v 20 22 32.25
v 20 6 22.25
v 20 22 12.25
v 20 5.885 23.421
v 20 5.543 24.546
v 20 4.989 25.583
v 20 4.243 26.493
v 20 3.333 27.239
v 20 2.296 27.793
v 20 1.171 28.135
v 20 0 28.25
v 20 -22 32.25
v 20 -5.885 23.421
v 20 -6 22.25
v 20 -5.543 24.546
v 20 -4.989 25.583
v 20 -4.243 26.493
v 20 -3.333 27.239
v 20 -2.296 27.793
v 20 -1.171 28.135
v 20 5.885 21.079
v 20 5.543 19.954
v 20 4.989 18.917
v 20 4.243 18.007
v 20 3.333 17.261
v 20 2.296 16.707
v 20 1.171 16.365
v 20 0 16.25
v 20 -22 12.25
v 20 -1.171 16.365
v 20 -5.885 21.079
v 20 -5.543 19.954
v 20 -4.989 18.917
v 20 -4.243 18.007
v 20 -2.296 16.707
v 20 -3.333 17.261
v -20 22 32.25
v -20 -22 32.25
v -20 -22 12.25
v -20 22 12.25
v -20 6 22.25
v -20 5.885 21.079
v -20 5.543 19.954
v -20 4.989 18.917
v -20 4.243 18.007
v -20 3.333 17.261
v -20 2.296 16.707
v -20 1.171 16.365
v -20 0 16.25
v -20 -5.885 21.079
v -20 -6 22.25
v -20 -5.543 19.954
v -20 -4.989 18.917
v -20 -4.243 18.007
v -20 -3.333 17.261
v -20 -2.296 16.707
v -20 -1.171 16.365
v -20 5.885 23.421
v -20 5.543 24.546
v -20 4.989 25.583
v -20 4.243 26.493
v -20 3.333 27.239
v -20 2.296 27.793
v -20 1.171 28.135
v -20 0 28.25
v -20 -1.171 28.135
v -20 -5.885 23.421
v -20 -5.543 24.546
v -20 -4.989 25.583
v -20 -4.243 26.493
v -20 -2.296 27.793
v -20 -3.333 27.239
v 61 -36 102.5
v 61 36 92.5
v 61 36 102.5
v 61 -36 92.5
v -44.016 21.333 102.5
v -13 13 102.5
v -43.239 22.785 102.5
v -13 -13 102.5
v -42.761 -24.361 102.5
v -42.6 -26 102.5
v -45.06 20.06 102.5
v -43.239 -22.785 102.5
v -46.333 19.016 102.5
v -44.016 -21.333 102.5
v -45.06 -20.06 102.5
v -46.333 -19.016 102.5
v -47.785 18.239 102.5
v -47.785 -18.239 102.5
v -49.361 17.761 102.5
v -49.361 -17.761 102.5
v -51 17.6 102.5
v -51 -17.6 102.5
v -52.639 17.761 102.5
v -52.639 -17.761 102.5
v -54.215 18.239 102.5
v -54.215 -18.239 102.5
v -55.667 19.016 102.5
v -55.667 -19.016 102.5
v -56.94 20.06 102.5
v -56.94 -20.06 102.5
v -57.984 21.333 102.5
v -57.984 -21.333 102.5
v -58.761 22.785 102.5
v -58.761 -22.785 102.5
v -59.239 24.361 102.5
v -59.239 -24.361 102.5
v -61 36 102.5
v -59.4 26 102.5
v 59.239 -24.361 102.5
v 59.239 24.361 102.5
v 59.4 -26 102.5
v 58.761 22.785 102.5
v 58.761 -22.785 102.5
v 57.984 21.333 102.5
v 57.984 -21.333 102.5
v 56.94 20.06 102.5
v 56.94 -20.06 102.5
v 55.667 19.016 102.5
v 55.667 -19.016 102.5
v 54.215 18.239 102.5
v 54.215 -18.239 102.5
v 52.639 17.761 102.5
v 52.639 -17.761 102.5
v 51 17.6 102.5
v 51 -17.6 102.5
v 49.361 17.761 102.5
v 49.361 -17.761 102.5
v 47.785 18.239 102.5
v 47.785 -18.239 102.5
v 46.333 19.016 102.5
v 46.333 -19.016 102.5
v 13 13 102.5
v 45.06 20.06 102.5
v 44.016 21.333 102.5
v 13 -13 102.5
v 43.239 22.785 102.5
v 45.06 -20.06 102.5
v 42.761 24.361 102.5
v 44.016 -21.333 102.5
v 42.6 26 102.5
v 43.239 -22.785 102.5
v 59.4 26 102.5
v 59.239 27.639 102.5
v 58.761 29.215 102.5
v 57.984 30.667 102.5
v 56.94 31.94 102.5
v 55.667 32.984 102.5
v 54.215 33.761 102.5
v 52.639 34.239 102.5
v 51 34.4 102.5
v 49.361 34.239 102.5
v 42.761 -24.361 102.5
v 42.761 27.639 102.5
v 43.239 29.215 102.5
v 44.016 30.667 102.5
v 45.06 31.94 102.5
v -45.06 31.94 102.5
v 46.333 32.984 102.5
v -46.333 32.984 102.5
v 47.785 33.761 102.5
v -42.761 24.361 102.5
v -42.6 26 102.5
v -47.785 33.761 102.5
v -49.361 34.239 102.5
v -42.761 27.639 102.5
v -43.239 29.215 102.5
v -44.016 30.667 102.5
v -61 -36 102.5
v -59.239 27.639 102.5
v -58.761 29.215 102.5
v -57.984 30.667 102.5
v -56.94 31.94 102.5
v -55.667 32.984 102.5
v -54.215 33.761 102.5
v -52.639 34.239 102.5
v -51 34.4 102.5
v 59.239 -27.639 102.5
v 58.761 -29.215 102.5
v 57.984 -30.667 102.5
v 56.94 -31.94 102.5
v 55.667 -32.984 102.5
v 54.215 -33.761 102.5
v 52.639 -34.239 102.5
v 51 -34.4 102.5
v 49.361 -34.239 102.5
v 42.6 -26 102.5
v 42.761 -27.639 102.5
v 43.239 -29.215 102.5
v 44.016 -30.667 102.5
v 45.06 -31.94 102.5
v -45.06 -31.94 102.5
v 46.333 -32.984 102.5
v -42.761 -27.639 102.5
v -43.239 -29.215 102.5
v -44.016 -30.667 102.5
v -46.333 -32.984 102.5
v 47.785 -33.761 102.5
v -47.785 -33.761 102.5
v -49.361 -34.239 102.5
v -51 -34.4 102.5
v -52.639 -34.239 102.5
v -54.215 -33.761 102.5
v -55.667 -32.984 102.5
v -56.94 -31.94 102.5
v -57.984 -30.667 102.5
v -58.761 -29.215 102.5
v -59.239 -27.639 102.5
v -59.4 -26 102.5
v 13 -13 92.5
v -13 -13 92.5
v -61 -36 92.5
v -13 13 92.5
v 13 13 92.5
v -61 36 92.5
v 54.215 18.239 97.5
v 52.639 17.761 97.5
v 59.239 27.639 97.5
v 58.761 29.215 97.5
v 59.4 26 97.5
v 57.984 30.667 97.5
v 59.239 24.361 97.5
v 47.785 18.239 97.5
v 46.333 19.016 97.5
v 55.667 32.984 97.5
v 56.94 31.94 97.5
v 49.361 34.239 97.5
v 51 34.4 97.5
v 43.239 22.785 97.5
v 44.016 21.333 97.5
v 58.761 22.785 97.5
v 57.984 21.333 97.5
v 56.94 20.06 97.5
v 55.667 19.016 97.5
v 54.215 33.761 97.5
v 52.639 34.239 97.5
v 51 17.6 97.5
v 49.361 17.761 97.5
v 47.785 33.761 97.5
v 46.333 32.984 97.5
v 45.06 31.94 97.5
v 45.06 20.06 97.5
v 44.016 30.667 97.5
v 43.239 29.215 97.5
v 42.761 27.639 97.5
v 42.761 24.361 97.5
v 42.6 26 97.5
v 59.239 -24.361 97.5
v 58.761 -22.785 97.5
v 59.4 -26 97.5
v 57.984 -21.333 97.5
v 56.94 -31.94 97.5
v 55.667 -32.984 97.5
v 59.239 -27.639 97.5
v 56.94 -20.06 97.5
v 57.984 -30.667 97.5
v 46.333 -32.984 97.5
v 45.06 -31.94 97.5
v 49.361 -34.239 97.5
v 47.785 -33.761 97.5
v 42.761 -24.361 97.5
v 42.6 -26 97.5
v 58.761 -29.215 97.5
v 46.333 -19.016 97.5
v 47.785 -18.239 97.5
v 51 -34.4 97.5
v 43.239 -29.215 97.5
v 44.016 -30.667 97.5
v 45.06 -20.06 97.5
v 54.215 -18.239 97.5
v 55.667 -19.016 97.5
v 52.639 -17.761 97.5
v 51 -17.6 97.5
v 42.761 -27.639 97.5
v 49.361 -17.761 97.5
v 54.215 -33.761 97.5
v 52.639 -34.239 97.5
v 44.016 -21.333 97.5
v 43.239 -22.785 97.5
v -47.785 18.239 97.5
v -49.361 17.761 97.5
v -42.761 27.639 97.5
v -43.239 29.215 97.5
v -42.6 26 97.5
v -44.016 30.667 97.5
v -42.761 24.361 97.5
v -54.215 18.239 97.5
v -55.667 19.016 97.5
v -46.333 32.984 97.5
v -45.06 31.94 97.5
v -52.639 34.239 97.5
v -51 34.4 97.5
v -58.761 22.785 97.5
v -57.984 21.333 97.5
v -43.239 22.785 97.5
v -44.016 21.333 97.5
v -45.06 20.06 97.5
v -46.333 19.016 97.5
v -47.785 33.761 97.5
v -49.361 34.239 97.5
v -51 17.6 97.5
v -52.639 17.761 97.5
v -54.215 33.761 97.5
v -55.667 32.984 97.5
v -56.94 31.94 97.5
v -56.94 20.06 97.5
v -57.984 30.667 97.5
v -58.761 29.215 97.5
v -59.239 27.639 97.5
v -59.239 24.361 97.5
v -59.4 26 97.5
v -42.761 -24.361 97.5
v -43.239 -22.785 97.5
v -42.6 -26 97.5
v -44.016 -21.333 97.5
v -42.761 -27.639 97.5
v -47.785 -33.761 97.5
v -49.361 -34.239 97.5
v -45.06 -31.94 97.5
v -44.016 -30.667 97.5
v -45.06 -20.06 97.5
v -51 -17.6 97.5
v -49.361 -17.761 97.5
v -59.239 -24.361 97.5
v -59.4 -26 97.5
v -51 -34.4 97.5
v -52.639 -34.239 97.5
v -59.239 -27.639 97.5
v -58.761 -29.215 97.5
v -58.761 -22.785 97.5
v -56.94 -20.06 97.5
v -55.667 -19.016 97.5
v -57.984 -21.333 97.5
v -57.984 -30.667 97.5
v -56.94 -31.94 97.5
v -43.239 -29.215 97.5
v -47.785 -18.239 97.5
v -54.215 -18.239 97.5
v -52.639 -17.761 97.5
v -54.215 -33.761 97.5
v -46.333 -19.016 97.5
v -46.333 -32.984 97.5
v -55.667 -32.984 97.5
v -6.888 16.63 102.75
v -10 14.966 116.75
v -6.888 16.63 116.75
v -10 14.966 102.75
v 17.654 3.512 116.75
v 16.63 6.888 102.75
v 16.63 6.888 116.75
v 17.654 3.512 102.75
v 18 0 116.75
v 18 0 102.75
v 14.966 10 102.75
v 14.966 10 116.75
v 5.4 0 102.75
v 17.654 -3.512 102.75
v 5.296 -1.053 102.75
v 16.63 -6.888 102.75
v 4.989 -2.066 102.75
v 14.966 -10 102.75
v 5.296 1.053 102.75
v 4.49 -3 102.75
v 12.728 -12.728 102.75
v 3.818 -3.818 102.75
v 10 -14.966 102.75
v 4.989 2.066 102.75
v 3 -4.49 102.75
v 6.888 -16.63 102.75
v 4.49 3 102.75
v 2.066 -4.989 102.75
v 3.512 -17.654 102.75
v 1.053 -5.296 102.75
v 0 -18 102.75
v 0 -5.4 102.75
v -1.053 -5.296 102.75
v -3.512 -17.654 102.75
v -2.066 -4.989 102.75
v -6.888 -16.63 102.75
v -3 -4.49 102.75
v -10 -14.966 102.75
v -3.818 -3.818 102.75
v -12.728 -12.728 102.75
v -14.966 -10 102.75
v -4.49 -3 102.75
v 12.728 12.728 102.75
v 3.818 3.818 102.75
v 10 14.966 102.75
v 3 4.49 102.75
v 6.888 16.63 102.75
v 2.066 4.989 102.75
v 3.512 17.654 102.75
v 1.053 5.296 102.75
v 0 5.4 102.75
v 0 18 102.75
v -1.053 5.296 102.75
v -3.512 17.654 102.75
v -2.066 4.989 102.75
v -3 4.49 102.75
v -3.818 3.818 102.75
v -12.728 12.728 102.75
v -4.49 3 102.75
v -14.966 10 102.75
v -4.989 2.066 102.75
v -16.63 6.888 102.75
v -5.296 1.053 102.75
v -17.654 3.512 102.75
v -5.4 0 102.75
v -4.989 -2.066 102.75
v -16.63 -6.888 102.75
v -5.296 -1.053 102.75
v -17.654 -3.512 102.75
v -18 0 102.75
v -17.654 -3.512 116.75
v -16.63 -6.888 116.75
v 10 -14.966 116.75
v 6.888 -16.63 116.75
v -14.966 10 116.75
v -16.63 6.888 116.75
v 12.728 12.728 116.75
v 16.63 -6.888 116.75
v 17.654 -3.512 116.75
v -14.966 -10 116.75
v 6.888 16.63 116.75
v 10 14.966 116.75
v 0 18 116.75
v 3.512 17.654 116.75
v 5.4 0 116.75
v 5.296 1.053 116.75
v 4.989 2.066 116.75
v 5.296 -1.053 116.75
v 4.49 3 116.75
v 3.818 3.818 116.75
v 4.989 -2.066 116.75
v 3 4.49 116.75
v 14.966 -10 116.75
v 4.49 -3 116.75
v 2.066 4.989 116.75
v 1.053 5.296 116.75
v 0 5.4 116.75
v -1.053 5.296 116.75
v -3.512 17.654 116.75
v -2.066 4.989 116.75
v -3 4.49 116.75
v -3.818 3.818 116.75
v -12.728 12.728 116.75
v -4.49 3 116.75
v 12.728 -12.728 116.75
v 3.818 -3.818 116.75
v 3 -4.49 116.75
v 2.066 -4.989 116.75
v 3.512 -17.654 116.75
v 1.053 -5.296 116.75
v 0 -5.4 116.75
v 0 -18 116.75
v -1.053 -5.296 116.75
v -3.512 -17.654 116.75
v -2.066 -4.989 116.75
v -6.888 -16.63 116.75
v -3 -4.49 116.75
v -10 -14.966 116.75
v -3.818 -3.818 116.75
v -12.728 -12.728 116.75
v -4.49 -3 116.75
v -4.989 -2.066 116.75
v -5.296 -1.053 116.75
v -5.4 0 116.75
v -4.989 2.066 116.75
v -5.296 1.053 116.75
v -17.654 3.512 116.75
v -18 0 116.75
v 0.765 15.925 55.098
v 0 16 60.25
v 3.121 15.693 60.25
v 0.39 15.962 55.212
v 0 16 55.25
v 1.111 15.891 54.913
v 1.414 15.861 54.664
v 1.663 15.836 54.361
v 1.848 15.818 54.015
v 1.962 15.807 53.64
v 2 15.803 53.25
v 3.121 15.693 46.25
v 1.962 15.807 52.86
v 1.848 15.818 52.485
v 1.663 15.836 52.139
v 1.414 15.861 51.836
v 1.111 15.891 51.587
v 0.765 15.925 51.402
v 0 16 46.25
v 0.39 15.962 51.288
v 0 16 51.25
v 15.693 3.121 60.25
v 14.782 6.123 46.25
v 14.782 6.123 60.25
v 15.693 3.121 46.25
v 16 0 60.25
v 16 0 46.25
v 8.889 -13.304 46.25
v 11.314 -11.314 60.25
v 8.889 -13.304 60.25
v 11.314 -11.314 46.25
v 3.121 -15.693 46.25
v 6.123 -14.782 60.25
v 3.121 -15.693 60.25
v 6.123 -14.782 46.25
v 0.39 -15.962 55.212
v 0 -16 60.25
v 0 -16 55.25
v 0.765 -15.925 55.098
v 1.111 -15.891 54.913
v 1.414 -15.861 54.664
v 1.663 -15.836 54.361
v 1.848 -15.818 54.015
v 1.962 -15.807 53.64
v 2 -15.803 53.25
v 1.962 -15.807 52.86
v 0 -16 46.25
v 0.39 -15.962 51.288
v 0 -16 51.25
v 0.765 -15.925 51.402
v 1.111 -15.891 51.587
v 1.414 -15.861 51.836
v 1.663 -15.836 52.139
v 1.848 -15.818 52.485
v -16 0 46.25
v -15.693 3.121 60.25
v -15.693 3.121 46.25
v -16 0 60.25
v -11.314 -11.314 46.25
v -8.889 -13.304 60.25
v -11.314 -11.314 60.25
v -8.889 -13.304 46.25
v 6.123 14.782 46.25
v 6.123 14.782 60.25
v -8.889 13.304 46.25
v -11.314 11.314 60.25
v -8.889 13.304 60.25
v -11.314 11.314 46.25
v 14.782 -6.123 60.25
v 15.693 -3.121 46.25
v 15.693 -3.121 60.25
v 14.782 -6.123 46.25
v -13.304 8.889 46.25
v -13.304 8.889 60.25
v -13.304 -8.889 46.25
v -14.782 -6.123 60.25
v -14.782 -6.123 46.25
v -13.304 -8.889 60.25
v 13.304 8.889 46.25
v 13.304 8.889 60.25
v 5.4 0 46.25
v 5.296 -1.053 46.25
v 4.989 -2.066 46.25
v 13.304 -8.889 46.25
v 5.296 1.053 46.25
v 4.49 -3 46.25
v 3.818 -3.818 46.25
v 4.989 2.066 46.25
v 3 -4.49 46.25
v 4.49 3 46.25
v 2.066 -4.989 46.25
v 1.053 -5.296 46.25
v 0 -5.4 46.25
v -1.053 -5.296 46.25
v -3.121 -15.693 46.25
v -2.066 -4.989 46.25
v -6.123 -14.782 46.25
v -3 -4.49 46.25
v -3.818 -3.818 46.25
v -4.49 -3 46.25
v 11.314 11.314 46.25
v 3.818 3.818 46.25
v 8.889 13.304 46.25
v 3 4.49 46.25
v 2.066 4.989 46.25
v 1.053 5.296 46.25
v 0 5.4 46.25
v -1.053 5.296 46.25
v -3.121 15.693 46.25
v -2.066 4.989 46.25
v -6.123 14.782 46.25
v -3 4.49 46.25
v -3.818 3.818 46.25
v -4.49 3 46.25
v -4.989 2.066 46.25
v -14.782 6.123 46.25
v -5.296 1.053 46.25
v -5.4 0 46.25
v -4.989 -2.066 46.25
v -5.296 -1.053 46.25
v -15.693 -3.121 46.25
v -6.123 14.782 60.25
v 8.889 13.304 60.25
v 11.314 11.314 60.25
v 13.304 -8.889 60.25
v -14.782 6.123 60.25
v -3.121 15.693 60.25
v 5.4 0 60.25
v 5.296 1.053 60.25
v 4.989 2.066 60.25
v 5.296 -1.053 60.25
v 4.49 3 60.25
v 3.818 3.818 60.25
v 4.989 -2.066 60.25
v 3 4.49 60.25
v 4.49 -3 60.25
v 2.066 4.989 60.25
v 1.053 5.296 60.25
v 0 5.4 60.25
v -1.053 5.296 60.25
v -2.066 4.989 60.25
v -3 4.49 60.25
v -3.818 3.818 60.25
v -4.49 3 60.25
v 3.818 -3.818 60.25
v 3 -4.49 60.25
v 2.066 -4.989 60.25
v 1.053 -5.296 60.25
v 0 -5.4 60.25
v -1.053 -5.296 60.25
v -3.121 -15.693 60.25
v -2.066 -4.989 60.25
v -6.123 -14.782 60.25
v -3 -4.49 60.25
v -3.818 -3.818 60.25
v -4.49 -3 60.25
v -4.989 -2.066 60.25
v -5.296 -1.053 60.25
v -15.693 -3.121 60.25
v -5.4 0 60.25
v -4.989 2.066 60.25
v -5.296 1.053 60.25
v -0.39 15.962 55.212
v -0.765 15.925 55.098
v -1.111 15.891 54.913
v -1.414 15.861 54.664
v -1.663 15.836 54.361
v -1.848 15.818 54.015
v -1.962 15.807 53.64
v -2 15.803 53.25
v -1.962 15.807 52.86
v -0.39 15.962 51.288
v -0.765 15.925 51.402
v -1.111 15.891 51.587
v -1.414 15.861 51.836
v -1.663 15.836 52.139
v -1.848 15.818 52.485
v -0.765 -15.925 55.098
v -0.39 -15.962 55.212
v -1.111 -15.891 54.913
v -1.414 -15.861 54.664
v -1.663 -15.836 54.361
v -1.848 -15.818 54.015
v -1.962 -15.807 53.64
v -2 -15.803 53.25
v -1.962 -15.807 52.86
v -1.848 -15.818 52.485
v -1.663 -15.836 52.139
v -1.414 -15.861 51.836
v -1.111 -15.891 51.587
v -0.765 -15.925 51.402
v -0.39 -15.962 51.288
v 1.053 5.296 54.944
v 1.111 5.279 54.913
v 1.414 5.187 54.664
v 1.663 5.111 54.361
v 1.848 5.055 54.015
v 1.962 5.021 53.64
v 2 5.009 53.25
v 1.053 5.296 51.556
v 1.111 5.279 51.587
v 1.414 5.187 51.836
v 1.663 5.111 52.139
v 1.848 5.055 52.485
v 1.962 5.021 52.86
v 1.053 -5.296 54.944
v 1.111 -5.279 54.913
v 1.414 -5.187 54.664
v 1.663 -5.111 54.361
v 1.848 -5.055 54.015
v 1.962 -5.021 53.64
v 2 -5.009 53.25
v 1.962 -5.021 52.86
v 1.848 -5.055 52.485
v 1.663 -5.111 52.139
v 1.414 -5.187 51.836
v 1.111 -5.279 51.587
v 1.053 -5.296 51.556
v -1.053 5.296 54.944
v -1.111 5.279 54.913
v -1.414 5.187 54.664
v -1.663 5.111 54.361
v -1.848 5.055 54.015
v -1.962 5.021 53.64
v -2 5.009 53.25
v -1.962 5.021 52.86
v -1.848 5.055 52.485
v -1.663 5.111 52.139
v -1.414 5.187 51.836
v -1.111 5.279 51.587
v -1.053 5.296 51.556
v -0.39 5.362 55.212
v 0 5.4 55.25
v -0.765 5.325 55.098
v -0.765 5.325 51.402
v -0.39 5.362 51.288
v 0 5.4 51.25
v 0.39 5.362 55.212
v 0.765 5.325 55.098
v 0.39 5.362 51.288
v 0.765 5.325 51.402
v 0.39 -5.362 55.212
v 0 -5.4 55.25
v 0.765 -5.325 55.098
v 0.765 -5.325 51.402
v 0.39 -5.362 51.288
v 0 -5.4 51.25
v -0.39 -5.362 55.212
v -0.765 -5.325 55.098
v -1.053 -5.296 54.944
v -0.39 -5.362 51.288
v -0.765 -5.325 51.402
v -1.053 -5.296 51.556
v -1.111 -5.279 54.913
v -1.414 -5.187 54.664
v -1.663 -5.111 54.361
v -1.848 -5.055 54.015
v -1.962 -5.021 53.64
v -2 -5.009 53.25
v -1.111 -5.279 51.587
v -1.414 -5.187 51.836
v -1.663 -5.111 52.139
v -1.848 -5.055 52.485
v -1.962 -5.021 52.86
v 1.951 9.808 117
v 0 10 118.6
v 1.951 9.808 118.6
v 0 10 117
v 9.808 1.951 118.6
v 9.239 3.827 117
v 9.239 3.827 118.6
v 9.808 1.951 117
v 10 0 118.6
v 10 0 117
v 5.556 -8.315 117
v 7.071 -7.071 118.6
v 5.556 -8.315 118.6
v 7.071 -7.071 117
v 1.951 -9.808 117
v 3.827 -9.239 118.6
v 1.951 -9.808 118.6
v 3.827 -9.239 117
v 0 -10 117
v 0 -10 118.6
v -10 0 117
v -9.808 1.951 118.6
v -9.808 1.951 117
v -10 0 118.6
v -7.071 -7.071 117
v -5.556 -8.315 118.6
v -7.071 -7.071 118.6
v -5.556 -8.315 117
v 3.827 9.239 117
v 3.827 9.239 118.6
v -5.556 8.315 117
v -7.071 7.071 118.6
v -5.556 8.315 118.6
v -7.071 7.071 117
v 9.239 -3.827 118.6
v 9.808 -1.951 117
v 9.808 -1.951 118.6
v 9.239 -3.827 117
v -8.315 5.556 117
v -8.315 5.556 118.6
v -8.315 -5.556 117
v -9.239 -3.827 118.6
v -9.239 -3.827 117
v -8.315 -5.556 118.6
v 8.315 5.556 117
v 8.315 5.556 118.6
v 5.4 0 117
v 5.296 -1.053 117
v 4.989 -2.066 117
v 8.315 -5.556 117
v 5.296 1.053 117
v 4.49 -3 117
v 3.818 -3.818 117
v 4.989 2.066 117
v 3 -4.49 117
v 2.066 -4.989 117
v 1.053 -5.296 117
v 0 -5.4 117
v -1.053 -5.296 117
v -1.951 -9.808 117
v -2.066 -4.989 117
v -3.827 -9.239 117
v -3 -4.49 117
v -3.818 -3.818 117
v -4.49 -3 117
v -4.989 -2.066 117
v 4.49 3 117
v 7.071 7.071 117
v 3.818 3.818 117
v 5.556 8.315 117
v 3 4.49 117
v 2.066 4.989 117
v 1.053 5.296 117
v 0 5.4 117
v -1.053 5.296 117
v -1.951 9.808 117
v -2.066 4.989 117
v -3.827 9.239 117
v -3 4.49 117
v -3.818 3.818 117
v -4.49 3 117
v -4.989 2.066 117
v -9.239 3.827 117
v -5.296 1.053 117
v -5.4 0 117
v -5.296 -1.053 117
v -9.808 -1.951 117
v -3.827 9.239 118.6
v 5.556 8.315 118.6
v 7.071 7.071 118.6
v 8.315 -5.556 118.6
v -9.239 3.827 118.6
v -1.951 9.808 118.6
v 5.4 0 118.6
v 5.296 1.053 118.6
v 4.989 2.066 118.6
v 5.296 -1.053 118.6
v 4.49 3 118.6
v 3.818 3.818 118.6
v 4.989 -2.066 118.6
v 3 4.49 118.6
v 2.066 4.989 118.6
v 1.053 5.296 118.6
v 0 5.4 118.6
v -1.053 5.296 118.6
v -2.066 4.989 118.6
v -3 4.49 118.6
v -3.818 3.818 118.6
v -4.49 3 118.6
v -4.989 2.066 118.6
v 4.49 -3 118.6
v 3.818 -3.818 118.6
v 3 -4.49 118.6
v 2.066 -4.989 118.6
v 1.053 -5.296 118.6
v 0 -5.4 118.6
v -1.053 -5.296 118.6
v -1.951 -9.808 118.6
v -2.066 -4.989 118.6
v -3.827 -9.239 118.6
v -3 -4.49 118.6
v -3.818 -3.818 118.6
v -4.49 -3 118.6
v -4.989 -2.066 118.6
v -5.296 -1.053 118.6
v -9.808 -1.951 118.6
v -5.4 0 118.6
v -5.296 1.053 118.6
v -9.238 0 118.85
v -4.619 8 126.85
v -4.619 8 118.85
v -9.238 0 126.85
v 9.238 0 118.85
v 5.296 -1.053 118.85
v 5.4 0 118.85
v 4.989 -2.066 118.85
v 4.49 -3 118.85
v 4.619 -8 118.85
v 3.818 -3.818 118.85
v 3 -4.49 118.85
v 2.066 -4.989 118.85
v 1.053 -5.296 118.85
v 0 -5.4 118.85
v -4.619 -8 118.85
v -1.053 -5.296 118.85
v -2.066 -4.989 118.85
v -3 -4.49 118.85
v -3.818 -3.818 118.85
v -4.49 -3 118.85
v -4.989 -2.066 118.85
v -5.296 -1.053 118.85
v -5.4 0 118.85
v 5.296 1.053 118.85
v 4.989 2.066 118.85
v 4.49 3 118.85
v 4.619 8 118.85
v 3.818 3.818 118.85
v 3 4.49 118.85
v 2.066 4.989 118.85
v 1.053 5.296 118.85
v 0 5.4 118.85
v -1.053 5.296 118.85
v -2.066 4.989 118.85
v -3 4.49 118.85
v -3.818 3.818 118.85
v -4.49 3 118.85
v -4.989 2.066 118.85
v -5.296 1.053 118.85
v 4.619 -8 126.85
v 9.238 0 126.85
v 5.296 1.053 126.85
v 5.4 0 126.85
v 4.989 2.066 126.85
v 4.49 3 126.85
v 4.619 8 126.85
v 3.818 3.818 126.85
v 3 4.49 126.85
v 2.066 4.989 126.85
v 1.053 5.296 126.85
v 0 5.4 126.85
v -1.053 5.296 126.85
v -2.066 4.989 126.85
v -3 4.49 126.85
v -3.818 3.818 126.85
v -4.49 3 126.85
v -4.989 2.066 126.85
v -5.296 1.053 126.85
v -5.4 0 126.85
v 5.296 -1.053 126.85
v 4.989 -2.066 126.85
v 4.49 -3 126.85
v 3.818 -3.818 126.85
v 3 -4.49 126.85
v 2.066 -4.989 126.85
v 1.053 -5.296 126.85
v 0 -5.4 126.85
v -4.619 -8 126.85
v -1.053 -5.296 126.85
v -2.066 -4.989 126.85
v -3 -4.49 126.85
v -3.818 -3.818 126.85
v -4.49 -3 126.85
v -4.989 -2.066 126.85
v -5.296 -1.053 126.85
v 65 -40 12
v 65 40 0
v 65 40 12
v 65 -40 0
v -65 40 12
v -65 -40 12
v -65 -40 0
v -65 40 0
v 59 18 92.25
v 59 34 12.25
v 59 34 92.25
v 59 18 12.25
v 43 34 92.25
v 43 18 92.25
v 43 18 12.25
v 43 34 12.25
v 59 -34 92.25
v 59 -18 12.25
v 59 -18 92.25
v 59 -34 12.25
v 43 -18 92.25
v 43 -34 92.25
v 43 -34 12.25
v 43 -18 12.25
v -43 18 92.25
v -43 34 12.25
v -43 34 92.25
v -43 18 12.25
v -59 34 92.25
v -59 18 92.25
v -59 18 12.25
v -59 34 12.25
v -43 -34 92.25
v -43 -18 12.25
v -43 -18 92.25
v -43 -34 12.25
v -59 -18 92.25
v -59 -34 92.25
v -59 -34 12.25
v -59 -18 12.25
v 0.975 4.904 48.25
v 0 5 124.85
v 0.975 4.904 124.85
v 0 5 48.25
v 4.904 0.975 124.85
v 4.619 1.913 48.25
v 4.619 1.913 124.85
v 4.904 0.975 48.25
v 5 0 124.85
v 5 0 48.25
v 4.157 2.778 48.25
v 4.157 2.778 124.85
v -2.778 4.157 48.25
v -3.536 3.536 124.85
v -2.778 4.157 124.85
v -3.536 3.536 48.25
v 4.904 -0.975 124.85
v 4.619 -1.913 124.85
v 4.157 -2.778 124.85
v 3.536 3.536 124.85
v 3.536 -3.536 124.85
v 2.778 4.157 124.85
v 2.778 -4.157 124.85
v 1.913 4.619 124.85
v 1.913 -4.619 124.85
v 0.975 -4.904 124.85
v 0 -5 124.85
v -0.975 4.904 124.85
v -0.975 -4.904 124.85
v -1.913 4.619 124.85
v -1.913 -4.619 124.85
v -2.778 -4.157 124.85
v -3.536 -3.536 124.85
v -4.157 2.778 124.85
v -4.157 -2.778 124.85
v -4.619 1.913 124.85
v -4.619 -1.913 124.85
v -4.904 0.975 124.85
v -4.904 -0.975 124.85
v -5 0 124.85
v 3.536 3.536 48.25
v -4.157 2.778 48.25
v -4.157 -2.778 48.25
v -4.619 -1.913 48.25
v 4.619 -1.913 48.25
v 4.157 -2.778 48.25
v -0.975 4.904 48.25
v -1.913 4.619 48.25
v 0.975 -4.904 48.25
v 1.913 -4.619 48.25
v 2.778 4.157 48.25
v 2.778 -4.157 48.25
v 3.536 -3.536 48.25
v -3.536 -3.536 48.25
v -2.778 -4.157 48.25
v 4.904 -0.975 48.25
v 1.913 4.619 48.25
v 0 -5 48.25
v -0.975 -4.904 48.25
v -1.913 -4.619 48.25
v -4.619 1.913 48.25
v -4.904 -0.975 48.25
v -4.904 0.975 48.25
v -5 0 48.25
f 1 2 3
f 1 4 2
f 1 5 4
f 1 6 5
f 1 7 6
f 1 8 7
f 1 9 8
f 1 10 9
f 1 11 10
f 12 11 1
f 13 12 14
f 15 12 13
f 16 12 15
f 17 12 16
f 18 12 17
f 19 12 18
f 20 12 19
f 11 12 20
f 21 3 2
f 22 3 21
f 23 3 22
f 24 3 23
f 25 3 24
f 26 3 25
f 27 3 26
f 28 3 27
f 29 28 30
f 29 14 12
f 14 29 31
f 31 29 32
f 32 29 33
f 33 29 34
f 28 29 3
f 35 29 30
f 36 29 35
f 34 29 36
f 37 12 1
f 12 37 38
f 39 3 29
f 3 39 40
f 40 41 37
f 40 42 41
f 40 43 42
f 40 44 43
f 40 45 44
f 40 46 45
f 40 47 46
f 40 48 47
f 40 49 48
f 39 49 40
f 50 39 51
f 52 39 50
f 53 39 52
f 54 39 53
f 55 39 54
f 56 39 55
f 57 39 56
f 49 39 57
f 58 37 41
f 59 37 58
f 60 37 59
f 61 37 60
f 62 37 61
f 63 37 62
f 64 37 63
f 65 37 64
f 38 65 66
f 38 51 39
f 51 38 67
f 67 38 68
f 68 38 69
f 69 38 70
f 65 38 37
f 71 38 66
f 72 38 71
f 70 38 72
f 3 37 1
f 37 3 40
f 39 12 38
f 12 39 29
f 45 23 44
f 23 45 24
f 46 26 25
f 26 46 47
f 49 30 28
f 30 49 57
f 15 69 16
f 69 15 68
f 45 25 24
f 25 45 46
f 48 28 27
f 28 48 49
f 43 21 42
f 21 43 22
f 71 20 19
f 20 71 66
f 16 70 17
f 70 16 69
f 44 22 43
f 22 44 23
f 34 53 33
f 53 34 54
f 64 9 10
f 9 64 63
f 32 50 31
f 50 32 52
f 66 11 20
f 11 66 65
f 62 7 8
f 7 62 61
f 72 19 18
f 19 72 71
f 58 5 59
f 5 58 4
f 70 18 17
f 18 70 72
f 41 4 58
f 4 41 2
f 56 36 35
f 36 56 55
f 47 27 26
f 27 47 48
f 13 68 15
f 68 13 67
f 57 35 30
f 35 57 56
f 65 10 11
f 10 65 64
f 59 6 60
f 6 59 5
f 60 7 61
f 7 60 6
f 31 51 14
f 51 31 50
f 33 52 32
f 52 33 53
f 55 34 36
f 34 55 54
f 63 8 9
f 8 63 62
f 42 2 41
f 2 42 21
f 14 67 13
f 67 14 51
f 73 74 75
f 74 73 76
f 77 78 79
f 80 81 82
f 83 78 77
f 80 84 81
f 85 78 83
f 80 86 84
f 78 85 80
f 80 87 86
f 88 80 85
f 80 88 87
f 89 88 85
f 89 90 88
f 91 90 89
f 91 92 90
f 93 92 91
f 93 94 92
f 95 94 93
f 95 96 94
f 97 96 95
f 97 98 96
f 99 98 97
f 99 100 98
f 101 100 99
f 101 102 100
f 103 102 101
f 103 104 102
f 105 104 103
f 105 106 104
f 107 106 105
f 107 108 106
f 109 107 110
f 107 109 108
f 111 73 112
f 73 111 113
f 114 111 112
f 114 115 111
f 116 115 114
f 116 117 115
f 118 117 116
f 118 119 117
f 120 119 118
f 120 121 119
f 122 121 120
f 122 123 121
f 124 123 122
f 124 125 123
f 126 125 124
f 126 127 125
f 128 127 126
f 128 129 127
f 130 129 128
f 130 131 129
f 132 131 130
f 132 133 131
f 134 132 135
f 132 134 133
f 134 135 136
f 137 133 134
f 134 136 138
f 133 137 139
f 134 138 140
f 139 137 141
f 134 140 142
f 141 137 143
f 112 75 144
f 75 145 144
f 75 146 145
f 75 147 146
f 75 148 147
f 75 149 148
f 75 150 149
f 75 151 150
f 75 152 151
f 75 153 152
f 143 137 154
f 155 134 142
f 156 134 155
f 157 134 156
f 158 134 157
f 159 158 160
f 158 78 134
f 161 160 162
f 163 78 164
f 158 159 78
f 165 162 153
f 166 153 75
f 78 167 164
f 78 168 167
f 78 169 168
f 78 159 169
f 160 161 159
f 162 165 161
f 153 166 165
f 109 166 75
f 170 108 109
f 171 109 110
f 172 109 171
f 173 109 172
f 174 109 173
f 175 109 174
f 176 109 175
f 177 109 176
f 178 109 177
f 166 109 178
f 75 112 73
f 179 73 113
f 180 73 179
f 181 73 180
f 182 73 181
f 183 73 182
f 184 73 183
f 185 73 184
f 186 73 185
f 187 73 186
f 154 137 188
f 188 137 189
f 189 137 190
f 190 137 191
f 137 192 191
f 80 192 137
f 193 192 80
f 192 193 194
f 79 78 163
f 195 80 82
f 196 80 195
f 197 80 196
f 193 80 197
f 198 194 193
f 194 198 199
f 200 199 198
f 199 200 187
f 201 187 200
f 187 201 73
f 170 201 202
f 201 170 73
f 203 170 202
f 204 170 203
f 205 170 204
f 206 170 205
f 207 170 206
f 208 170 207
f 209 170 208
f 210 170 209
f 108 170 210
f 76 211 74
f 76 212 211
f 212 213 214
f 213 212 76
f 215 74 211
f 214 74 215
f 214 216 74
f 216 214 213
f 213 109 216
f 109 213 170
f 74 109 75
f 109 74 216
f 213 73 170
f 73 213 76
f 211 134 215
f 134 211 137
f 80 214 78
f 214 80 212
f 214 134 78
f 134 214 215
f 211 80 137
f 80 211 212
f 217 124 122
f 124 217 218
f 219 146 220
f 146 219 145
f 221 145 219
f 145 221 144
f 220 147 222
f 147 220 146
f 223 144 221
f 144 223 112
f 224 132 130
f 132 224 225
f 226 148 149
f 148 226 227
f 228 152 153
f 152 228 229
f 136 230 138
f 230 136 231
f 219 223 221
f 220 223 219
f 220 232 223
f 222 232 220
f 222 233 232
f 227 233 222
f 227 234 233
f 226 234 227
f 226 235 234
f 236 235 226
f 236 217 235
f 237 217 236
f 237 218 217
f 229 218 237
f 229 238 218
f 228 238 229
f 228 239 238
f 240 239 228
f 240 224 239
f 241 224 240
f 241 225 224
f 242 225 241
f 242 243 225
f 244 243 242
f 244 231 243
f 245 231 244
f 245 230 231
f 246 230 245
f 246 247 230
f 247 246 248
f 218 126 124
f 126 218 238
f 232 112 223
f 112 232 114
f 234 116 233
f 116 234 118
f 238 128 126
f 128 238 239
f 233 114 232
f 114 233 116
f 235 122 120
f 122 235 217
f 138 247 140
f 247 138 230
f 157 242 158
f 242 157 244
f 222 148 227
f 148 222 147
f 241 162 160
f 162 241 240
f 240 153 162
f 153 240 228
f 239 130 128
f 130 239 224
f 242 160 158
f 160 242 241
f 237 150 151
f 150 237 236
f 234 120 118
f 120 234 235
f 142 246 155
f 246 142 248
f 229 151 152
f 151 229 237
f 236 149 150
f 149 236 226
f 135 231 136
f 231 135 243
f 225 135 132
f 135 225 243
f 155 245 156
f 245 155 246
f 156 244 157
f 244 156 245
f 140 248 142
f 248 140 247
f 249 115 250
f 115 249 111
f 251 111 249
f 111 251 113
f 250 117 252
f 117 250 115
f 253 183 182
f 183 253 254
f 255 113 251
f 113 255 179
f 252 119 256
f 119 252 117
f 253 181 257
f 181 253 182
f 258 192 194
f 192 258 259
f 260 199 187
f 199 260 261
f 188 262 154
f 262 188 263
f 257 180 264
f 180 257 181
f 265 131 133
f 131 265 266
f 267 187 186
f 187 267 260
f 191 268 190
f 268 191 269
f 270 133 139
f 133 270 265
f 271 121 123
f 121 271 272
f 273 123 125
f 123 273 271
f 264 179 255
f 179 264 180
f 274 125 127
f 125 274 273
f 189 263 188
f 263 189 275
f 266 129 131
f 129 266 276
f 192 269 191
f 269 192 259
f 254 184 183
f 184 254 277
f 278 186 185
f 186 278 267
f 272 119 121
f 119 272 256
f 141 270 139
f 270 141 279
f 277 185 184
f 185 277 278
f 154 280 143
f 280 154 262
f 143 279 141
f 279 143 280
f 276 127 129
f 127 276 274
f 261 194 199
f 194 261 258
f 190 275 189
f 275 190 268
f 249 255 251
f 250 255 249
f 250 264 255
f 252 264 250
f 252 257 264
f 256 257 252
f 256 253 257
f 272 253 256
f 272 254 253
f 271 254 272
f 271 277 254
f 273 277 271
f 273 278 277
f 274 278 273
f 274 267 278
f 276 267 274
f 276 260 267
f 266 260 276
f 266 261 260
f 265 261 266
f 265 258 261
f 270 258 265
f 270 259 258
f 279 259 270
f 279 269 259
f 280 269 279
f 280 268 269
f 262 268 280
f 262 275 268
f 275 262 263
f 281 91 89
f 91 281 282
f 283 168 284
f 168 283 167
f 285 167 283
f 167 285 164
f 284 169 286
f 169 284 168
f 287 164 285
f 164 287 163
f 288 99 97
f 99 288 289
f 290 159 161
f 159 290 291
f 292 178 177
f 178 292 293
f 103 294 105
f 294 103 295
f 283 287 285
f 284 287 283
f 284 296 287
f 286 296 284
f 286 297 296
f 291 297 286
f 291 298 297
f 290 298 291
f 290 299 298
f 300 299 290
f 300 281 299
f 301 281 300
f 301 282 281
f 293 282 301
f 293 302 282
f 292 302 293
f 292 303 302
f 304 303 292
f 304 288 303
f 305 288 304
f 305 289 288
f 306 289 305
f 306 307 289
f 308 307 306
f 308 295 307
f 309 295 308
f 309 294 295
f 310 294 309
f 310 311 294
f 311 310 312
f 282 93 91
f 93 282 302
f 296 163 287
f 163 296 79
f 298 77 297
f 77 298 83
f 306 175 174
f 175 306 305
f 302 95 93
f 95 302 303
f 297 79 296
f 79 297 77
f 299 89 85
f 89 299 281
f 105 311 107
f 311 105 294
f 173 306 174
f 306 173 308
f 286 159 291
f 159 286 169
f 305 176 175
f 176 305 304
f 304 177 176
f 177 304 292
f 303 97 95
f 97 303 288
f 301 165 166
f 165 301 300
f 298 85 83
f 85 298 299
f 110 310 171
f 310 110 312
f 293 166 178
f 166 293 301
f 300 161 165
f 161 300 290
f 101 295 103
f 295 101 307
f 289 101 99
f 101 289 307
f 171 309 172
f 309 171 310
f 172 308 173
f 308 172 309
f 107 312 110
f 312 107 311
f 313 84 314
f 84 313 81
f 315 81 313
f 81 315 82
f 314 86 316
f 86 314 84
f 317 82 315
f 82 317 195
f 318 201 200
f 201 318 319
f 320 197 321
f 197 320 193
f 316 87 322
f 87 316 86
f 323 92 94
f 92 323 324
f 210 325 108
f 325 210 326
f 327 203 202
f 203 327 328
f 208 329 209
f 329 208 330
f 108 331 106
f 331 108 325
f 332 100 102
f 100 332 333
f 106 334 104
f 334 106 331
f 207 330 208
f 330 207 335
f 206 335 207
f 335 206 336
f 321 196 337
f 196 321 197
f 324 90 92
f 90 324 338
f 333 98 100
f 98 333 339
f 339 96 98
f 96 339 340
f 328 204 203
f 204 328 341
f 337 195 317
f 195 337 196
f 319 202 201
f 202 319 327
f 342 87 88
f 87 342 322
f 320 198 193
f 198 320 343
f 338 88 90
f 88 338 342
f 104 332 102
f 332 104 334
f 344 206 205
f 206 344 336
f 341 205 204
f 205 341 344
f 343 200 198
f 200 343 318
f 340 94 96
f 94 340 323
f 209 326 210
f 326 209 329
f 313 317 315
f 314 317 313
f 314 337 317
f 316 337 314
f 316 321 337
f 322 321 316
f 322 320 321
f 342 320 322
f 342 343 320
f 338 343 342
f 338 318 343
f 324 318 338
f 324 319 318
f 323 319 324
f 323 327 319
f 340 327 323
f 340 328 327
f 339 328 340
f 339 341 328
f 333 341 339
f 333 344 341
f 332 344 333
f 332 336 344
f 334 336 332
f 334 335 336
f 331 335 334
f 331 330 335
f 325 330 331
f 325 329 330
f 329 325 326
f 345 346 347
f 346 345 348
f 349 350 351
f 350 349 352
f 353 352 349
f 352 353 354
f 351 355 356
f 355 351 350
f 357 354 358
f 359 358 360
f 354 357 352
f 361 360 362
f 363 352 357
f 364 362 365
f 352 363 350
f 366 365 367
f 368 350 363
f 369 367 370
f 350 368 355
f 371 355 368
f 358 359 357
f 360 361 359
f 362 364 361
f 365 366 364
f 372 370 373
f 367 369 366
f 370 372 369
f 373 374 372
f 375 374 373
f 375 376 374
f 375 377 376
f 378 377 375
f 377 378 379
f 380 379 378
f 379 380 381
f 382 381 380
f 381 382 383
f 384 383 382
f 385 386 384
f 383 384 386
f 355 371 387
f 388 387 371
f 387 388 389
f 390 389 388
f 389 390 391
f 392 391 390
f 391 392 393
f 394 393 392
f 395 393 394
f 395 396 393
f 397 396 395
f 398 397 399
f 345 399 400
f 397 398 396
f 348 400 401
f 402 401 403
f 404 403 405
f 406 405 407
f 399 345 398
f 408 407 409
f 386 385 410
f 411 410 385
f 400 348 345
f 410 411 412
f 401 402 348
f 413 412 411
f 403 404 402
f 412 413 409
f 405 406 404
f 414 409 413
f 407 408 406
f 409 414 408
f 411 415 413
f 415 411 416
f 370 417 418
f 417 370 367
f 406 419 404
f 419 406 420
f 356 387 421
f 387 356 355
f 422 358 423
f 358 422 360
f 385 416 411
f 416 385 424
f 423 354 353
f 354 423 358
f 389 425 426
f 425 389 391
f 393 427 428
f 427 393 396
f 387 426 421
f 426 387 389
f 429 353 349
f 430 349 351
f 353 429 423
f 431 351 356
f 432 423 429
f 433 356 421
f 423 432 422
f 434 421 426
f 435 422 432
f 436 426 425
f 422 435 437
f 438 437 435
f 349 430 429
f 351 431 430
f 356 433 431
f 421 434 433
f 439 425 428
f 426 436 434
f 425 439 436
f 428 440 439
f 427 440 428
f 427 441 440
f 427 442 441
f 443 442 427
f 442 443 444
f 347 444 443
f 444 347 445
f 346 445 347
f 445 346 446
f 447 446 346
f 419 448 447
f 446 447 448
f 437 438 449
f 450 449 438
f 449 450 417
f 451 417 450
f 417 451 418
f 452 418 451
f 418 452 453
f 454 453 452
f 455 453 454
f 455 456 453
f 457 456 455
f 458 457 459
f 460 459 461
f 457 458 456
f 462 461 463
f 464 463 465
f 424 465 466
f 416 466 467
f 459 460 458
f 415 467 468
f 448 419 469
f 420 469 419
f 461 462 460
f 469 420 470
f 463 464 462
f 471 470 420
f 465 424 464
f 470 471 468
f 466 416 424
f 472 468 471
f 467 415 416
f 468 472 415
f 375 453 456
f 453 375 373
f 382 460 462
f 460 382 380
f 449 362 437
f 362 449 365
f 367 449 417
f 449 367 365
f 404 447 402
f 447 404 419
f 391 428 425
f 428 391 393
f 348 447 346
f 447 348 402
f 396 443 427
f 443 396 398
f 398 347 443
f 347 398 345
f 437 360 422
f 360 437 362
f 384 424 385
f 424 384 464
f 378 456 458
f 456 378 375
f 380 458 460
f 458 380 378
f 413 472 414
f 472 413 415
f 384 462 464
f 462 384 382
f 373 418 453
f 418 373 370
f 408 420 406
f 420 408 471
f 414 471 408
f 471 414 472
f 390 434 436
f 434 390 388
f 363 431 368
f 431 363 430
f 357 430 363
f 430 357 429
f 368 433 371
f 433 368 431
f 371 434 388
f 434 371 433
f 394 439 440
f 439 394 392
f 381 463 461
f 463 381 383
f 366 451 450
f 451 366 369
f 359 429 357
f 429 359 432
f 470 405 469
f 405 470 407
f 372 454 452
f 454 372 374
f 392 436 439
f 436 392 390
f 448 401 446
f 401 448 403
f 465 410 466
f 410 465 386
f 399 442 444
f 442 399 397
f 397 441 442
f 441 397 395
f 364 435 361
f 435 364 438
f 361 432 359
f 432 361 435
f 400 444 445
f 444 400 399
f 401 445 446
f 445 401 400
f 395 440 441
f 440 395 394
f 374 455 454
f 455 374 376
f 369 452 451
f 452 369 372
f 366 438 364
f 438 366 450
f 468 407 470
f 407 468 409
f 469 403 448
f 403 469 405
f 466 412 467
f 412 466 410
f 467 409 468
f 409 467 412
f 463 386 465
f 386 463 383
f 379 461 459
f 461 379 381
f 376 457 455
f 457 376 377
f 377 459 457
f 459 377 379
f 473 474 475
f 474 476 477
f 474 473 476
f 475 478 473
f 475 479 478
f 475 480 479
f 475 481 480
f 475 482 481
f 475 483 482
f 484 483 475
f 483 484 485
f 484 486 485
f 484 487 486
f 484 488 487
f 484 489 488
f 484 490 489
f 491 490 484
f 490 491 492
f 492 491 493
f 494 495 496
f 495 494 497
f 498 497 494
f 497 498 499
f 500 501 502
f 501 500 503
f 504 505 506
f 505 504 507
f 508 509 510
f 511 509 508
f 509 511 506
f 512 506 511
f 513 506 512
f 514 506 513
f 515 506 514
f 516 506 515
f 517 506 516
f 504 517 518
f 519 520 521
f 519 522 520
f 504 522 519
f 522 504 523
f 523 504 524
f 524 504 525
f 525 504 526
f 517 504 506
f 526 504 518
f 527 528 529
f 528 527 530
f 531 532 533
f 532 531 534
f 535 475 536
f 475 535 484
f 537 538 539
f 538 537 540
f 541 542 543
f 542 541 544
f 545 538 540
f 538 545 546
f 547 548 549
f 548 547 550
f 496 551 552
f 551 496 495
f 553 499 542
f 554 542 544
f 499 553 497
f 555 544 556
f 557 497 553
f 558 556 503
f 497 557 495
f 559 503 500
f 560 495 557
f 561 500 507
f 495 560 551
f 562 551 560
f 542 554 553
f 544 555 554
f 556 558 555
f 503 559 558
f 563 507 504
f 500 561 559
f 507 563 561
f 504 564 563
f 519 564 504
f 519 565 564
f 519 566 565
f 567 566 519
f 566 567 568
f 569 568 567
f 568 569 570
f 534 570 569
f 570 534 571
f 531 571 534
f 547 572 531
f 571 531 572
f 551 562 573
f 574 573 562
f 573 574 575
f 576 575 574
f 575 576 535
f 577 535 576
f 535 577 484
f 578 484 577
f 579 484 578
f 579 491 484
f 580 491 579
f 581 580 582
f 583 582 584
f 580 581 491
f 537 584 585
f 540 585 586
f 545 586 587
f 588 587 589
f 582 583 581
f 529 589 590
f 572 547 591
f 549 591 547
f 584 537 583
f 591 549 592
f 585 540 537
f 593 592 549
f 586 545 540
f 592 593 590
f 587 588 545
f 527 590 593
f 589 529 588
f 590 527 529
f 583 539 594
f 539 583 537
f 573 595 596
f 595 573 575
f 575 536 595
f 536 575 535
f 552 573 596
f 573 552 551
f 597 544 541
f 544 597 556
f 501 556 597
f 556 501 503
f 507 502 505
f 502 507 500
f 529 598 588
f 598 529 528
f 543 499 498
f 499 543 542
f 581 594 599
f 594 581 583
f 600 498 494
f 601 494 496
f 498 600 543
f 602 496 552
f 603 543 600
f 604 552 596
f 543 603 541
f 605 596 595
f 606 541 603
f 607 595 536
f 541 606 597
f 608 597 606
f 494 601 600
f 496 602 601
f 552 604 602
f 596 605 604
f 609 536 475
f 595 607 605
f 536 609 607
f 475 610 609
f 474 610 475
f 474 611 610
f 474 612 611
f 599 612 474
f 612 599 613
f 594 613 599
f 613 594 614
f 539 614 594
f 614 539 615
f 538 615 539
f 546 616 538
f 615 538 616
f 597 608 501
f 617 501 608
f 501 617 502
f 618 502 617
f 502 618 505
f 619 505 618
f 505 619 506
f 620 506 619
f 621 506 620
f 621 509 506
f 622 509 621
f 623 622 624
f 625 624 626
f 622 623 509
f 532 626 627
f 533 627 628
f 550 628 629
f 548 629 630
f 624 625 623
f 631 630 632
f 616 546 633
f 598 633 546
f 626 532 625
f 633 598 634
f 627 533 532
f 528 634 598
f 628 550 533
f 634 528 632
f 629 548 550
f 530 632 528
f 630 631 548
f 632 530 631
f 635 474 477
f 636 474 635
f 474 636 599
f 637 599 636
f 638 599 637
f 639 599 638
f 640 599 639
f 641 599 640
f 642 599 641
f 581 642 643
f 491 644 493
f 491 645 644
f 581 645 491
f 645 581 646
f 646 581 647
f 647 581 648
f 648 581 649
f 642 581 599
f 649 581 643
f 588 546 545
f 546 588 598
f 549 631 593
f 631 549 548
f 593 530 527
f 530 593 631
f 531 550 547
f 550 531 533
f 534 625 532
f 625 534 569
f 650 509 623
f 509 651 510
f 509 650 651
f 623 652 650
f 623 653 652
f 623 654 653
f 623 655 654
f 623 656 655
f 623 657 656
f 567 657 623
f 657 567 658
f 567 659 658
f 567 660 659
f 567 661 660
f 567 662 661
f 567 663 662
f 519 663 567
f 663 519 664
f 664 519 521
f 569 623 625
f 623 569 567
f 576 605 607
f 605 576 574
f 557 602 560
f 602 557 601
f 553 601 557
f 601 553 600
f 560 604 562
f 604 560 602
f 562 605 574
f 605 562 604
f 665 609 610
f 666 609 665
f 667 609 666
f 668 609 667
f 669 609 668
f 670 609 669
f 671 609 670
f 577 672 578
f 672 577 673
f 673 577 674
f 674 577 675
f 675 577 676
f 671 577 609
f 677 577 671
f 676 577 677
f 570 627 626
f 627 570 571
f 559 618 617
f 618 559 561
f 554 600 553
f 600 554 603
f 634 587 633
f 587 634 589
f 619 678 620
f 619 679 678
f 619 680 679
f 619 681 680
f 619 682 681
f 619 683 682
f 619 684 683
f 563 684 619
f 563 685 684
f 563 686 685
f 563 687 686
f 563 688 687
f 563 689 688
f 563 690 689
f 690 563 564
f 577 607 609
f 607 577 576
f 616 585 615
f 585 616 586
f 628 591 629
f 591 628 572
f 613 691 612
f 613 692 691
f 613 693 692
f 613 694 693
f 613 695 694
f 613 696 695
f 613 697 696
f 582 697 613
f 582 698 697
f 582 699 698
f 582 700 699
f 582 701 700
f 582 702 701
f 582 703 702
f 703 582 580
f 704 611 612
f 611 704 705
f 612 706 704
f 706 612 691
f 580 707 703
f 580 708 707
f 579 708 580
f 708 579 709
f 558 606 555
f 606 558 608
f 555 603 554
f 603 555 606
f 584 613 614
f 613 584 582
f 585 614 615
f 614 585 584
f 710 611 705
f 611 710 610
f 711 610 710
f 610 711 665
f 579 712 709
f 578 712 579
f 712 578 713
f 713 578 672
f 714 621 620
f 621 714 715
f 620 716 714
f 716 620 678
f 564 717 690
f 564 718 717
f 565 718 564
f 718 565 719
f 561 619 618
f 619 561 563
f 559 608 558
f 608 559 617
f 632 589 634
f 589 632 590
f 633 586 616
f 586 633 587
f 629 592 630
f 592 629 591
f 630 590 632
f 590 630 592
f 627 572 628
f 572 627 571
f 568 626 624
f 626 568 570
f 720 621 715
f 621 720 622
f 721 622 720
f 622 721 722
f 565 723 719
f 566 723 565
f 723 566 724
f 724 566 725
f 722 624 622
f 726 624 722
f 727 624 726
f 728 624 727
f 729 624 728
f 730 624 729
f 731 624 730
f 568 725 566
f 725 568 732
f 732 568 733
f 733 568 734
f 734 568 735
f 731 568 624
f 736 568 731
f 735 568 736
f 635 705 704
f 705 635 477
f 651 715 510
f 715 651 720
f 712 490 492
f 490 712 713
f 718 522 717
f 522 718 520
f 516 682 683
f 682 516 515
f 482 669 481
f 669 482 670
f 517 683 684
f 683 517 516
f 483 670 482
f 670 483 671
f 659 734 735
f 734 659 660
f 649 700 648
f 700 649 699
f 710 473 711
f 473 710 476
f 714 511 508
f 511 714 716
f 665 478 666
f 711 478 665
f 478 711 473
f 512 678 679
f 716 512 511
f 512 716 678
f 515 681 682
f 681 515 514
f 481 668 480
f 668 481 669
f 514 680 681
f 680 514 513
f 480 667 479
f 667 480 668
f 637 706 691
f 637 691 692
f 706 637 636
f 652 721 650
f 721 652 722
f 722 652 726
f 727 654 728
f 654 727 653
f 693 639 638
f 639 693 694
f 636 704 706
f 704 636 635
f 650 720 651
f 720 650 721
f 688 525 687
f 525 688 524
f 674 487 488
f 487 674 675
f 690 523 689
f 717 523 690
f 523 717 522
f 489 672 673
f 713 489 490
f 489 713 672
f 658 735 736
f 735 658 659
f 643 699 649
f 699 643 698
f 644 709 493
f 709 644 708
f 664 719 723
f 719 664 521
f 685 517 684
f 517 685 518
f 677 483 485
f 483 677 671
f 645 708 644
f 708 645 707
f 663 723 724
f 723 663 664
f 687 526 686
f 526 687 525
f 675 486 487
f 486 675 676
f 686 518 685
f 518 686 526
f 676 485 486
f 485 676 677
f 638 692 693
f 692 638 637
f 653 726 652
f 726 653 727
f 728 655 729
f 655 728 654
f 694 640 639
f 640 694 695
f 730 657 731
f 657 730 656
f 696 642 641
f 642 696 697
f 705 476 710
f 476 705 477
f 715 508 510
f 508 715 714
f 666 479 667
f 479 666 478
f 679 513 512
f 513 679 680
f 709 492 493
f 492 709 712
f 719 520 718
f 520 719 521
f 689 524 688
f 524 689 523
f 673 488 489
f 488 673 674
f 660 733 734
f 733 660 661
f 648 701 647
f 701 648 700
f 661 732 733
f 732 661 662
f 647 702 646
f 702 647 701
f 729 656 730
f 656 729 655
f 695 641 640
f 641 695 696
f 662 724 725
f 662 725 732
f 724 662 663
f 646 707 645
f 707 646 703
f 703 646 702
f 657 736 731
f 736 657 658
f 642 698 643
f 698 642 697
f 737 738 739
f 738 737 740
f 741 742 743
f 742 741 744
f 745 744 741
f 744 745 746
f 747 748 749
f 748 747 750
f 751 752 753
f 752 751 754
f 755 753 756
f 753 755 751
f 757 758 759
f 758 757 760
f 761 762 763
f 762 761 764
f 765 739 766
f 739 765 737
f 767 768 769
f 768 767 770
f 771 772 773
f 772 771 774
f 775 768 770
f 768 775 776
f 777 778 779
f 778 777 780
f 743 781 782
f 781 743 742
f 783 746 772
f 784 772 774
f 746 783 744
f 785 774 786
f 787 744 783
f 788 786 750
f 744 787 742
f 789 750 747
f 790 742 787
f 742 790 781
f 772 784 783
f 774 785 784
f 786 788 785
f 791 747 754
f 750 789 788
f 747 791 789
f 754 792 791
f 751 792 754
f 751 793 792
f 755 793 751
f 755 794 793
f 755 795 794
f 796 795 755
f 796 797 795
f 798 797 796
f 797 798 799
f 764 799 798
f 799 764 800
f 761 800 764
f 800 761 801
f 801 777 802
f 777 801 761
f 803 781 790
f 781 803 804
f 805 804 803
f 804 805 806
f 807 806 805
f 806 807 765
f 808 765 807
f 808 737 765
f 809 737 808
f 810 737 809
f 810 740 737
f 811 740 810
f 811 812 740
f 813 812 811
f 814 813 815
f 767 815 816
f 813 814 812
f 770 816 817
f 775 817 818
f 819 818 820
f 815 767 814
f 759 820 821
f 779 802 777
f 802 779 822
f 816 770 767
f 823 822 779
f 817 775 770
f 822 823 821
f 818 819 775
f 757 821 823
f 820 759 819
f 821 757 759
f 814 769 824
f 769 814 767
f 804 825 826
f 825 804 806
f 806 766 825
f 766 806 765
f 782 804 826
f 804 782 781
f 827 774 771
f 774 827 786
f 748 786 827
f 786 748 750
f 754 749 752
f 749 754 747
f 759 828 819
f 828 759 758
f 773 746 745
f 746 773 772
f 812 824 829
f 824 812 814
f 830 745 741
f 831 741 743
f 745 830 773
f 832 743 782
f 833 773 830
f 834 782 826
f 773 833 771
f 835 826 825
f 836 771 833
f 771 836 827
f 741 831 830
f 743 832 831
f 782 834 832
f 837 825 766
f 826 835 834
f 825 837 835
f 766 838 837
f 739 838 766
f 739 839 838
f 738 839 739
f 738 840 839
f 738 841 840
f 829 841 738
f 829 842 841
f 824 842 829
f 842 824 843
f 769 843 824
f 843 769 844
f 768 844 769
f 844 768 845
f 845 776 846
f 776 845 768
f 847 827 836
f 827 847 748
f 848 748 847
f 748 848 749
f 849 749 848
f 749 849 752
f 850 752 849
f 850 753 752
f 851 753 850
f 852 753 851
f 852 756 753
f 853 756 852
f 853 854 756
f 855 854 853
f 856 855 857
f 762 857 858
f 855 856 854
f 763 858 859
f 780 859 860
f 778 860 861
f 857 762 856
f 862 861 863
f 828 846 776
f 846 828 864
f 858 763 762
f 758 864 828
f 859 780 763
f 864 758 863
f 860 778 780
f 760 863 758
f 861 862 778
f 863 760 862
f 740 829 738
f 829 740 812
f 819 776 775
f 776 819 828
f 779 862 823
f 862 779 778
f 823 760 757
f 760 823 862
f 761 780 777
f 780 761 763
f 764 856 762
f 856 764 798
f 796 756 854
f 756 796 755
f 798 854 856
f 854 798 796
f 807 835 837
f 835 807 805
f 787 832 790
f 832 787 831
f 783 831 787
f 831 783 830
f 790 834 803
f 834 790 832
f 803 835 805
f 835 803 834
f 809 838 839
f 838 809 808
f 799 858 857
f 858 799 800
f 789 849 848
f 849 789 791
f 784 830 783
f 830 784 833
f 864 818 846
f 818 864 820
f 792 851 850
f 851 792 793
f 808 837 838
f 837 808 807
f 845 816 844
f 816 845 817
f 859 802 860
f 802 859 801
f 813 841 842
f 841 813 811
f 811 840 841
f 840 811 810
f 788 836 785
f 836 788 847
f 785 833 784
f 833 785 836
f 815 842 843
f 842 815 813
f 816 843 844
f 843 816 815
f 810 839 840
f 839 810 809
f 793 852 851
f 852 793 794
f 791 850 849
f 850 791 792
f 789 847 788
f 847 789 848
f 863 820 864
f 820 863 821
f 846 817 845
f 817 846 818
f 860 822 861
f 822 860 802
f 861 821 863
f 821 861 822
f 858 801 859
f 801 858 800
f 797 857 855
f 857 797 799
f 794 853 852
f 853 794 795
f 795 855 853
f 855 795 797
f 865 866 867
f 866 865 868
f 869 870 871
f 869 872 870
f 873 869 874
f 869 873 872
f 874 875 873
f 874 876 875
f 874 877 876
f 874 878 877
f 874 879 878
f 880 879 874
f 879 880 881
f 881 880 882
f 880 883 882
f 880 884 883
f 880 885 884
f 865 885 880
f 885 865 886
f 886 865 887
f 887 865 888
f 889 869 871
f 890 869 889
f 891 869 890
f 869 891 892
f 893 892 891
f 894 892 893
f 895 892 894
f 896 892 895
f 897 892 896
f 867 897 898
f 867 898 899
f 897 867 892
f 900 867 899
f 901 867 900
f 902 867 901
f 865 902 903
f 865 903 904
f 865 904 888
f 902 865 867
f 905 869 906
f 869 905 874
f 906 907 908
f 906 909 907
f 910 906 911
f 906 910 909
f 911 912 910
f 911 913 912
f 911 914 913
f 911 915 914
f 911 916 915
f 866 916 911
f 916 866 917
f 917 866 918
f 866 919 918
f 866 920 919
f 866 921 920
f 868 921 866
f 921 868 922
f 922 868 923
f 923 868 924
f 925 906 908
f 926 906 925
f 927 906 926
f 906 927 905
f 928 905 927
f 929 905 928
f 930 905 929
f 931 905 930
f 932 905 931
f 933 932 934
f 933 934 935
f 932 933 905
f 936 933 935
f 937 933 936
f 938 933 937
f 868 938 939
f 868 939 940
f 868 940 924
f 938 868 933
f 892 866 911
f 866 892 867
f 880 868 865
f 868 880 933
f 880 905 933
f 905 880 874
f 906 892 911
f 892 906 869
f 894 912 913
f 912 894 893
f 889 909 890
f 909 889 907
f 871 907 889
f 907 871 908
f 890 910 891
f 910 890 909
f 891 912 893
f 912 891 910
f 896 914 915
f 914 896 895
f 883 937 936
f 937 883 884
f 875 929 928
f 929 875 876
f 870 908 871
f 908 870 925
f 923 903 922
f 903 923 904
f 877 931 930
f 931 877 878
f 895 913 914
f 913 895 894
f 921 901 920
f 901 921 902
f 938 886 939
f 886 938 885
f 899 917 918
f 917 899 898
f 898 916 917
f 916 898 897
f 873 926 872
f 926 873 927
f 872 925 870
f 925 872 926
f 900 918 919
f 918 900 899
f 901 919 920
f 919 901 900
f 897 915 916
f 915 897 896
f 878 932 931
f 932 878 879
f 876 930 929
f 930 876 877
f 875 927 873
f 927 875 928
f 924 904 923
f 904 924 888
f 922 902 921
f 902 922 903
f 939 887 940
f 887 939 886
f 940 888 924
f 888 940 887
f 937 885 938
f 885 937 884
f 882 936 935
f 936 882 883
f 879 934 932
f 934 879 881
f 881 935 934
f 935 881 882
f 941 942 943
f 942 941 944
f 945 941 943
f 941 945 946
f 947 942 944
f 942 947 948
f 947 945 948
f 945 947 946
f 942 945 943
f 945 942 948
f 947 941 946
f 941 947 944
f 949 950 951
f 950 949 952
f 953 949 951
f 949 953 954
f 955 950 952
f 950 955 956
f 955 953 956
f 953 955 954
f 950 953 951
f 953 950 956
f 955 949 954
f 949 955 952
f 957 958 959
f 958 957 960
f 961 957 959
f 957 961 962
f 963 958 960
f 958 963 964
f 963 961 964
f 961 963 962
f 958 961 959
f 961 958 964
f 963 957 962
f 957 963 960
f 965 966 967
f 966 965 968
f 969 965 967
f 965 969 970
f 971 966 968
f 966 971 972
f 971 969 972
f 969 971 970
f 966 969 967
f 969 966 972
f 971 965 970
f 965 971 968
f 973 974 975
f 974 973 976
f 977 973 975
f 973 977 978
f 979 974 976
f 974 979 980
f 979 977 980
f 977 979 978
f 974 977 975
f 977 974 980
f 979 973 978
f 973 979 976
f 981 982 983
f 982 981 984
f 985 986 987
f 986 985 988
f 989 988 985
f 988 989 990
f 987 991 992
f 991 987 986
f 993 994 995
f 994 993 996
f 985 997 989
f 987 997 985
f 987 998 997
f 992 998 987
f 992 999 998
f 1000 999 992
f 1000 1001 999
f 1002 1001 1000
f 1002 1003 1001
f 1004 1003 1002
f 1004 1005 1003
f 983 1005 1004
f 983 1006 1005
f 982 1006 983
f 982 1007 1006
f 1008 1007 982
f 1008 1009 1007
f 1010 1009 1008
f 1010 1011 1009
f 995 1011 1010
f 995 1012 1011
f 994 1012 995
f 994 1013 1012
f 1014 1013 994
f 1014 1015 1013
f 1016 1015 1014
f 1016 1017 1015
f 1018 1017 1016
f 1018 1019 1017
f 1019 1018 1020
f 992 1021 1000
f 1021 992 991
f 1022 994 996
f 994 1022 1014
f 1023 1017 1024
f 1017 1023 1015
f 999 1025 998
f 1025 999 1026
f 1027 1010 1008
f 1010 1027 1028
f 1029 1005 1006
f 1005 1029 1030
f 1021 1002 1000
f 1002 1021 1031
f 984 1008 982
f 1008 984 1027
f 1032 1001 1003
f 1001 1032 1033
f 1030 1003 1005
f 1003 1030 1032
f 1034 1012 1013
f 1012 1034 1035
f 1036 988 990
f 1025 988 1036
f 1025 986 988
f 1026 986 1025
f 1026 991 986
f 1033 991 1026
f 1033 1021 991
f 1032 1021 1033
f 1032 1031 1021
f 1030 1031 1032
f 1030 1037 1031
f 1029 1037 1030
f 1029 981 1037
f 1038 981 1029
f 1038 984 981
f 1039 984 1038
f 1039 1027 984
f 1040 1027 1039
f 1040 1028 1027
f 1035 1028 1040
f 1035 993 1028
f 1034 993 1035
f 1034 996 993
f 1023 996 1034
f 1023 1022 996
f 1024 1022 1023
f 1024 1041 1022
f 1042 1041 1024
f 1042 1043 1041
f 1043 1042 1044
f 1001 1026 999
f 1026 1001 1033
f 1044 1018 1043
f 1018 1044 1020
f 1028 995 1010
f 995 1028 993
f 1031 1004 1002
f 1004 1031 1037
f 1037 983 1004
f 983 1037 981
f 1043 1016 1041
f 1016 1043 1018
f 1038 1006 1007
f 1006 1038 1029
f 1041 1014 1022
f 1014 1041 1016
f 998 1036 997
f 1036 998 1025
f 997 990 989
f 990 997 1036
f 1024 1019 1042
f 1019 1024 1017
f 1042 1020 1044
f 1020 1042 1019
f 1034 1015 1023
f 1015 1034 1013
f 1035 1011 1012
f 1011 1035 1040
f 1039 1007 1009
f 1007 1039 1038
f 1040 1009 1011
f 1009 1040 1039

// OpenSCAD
$fn = 32;

// ------------------------------------------------------------------------
// Arbor press fixture: screw d10, posts 80 mm, gap 14 mm
// Every part is its own module, assembly() places every instance.
// ------------------------------------------------------------------------

// --- part 1 ---
module press_bed() {
  difference() {
    translate([-65, -40, 0]) cube([130, 80, 12]);
  }
}

// --- part 2 ---
module anvil_block() {
  difference() {
    translate([-20, -22, 0]) cube([40, 44, 20]);
    translate([0, 0, 10]) rotate([0, 90, 0]) cylinder(h = 42, d = 12, center = true);
  }
}

// --- part 3 ---
module press_post_a() {
  translate([-8, -8, 0]) cube([16, 16, 80]);
}

// --- part 4 ---
module press_post_b() {
  translate([-8, -8, 0]) cube([16, 16, 80]);
}

// --- part 5 ---
module press_post_c() {
  translate([-8, -8, 0]) cube([16, 16, 80]);
}

// --- part 6 ---
module press_post_d() {
  translate([-8, -8, 0]) cube([16, 16, 80]);
}

// --- part 7 ---
module press_frame() {
  difference() {
    translate([-61, -36, 0]) cube([122, 72, 10]);
    translate([-13, -13, -1]) cube([26, 26, 12]);
    translate([51, 26, 5]) cylinder(h = 6, d = 16.8);
    translate([51, -26, 5]) cylinder(h = 6, d = 16.8);
    translate([-51, 26, 5]) cylinder(h = 6, d = 16.8);
    translate([-51, -26, 5]) cylinder(h = 6, d = 16.8);
  }
}

// --- part 8 ---
module guide_ring() {
  difference() {
      translate([0, 0, 0]) cylinder(h = 14, d = 36);
      translate([0, 0, -1]) cylinder(h = 16, d = 10.8);
    }
}

// --- part 9 ---
module press_screw() {
  translate([0, 0, -38.3]) cylinder(h = 76.6, d = 10);
}

// --- part 10 ---
module press_head() {
  difference() {
    cylinder(h = 14, d = 32);
    translate([0, 0, -1]) cylinder(h = 16, d = 10.8);
    translate([0, 0, 7]) rotate([90, 0, 0]) cylinder(h = 34, d = 4, center = true);
  }
}

// --- part 11 ---
module nut_washer() {
  difference() {
      translate([0, 0, 0]) cylinder(h = 1.6, d = 20);
      translate([0, 0, -1]) cylinder(h = 3.6, d = 10.8);
    }
}

// --- part 12 ---
module press_nut() {
  difference() {
    linear_extrude(height = 8) polygon(points = [[9.238, 0], [4.619, 8], [-4.619, 8], [-9.238, 0], [-4.619, -8], [4.619, -8]]);
    translate([0, 0, -1]) cylinder(h = 10, d = 10.8);
  }
}

// --- assembly ---
module assembly() {
  color([0.80, 0.24, 0.20]) translate([0, 0, 0]) rotate([0, 0, 0]) press_bed();
  color([0.20, 0.45, 0.75]) translate([0, 0, 12.25]) rotate([0, 0, 0]) anvil_block();
  color([0.25, 0.62, 0.32]) translate([51, 26, 12.25]) rotate([0, 0, 0]) press_post_a();
  color([0.92, 0.70, 0.18]) translate([51, -26, 12.25]) rotate([0, 0, 0]) press_post_b();
  color([0.58, 0.35, 0.70]) translate([-51, 26, 12.25]) rotate([0, 0, 0]) press_post_c();
  color([0.16, 0.66, 0.66]) translate([-51, -26, 12.25]) rotate([0, 0, 0]) press_post_d();
  color([0.85, 0.48, 0.18]) translate([0, 0, 92.5]) rotate([0, 0, 0]) press_frame();
  color([0.55, 0.60, 0.65]) translate([0, 0, 102.75]) rotate([0, 0, 0]) guide_ring();
  color([0.75, 0.30, 0.55]) translate([0, 0, 86.55]) rotate([0, 0, 0]) press_screw();
  color([0.42, 0.52, 0.28]) translate([0, 0, 46.25]) rotate([0, 0, 0]) press_head();
  color([0.80, 0.24, 0.20]) translate([0, 0, 117]) rotate([0, 0, 0]) nut_washer();
  color([0.20, 0.45, 0.75]) translate([0, 0, 118.85]) rotate([0, 0, 0]) press_nut();
}

assembly();
